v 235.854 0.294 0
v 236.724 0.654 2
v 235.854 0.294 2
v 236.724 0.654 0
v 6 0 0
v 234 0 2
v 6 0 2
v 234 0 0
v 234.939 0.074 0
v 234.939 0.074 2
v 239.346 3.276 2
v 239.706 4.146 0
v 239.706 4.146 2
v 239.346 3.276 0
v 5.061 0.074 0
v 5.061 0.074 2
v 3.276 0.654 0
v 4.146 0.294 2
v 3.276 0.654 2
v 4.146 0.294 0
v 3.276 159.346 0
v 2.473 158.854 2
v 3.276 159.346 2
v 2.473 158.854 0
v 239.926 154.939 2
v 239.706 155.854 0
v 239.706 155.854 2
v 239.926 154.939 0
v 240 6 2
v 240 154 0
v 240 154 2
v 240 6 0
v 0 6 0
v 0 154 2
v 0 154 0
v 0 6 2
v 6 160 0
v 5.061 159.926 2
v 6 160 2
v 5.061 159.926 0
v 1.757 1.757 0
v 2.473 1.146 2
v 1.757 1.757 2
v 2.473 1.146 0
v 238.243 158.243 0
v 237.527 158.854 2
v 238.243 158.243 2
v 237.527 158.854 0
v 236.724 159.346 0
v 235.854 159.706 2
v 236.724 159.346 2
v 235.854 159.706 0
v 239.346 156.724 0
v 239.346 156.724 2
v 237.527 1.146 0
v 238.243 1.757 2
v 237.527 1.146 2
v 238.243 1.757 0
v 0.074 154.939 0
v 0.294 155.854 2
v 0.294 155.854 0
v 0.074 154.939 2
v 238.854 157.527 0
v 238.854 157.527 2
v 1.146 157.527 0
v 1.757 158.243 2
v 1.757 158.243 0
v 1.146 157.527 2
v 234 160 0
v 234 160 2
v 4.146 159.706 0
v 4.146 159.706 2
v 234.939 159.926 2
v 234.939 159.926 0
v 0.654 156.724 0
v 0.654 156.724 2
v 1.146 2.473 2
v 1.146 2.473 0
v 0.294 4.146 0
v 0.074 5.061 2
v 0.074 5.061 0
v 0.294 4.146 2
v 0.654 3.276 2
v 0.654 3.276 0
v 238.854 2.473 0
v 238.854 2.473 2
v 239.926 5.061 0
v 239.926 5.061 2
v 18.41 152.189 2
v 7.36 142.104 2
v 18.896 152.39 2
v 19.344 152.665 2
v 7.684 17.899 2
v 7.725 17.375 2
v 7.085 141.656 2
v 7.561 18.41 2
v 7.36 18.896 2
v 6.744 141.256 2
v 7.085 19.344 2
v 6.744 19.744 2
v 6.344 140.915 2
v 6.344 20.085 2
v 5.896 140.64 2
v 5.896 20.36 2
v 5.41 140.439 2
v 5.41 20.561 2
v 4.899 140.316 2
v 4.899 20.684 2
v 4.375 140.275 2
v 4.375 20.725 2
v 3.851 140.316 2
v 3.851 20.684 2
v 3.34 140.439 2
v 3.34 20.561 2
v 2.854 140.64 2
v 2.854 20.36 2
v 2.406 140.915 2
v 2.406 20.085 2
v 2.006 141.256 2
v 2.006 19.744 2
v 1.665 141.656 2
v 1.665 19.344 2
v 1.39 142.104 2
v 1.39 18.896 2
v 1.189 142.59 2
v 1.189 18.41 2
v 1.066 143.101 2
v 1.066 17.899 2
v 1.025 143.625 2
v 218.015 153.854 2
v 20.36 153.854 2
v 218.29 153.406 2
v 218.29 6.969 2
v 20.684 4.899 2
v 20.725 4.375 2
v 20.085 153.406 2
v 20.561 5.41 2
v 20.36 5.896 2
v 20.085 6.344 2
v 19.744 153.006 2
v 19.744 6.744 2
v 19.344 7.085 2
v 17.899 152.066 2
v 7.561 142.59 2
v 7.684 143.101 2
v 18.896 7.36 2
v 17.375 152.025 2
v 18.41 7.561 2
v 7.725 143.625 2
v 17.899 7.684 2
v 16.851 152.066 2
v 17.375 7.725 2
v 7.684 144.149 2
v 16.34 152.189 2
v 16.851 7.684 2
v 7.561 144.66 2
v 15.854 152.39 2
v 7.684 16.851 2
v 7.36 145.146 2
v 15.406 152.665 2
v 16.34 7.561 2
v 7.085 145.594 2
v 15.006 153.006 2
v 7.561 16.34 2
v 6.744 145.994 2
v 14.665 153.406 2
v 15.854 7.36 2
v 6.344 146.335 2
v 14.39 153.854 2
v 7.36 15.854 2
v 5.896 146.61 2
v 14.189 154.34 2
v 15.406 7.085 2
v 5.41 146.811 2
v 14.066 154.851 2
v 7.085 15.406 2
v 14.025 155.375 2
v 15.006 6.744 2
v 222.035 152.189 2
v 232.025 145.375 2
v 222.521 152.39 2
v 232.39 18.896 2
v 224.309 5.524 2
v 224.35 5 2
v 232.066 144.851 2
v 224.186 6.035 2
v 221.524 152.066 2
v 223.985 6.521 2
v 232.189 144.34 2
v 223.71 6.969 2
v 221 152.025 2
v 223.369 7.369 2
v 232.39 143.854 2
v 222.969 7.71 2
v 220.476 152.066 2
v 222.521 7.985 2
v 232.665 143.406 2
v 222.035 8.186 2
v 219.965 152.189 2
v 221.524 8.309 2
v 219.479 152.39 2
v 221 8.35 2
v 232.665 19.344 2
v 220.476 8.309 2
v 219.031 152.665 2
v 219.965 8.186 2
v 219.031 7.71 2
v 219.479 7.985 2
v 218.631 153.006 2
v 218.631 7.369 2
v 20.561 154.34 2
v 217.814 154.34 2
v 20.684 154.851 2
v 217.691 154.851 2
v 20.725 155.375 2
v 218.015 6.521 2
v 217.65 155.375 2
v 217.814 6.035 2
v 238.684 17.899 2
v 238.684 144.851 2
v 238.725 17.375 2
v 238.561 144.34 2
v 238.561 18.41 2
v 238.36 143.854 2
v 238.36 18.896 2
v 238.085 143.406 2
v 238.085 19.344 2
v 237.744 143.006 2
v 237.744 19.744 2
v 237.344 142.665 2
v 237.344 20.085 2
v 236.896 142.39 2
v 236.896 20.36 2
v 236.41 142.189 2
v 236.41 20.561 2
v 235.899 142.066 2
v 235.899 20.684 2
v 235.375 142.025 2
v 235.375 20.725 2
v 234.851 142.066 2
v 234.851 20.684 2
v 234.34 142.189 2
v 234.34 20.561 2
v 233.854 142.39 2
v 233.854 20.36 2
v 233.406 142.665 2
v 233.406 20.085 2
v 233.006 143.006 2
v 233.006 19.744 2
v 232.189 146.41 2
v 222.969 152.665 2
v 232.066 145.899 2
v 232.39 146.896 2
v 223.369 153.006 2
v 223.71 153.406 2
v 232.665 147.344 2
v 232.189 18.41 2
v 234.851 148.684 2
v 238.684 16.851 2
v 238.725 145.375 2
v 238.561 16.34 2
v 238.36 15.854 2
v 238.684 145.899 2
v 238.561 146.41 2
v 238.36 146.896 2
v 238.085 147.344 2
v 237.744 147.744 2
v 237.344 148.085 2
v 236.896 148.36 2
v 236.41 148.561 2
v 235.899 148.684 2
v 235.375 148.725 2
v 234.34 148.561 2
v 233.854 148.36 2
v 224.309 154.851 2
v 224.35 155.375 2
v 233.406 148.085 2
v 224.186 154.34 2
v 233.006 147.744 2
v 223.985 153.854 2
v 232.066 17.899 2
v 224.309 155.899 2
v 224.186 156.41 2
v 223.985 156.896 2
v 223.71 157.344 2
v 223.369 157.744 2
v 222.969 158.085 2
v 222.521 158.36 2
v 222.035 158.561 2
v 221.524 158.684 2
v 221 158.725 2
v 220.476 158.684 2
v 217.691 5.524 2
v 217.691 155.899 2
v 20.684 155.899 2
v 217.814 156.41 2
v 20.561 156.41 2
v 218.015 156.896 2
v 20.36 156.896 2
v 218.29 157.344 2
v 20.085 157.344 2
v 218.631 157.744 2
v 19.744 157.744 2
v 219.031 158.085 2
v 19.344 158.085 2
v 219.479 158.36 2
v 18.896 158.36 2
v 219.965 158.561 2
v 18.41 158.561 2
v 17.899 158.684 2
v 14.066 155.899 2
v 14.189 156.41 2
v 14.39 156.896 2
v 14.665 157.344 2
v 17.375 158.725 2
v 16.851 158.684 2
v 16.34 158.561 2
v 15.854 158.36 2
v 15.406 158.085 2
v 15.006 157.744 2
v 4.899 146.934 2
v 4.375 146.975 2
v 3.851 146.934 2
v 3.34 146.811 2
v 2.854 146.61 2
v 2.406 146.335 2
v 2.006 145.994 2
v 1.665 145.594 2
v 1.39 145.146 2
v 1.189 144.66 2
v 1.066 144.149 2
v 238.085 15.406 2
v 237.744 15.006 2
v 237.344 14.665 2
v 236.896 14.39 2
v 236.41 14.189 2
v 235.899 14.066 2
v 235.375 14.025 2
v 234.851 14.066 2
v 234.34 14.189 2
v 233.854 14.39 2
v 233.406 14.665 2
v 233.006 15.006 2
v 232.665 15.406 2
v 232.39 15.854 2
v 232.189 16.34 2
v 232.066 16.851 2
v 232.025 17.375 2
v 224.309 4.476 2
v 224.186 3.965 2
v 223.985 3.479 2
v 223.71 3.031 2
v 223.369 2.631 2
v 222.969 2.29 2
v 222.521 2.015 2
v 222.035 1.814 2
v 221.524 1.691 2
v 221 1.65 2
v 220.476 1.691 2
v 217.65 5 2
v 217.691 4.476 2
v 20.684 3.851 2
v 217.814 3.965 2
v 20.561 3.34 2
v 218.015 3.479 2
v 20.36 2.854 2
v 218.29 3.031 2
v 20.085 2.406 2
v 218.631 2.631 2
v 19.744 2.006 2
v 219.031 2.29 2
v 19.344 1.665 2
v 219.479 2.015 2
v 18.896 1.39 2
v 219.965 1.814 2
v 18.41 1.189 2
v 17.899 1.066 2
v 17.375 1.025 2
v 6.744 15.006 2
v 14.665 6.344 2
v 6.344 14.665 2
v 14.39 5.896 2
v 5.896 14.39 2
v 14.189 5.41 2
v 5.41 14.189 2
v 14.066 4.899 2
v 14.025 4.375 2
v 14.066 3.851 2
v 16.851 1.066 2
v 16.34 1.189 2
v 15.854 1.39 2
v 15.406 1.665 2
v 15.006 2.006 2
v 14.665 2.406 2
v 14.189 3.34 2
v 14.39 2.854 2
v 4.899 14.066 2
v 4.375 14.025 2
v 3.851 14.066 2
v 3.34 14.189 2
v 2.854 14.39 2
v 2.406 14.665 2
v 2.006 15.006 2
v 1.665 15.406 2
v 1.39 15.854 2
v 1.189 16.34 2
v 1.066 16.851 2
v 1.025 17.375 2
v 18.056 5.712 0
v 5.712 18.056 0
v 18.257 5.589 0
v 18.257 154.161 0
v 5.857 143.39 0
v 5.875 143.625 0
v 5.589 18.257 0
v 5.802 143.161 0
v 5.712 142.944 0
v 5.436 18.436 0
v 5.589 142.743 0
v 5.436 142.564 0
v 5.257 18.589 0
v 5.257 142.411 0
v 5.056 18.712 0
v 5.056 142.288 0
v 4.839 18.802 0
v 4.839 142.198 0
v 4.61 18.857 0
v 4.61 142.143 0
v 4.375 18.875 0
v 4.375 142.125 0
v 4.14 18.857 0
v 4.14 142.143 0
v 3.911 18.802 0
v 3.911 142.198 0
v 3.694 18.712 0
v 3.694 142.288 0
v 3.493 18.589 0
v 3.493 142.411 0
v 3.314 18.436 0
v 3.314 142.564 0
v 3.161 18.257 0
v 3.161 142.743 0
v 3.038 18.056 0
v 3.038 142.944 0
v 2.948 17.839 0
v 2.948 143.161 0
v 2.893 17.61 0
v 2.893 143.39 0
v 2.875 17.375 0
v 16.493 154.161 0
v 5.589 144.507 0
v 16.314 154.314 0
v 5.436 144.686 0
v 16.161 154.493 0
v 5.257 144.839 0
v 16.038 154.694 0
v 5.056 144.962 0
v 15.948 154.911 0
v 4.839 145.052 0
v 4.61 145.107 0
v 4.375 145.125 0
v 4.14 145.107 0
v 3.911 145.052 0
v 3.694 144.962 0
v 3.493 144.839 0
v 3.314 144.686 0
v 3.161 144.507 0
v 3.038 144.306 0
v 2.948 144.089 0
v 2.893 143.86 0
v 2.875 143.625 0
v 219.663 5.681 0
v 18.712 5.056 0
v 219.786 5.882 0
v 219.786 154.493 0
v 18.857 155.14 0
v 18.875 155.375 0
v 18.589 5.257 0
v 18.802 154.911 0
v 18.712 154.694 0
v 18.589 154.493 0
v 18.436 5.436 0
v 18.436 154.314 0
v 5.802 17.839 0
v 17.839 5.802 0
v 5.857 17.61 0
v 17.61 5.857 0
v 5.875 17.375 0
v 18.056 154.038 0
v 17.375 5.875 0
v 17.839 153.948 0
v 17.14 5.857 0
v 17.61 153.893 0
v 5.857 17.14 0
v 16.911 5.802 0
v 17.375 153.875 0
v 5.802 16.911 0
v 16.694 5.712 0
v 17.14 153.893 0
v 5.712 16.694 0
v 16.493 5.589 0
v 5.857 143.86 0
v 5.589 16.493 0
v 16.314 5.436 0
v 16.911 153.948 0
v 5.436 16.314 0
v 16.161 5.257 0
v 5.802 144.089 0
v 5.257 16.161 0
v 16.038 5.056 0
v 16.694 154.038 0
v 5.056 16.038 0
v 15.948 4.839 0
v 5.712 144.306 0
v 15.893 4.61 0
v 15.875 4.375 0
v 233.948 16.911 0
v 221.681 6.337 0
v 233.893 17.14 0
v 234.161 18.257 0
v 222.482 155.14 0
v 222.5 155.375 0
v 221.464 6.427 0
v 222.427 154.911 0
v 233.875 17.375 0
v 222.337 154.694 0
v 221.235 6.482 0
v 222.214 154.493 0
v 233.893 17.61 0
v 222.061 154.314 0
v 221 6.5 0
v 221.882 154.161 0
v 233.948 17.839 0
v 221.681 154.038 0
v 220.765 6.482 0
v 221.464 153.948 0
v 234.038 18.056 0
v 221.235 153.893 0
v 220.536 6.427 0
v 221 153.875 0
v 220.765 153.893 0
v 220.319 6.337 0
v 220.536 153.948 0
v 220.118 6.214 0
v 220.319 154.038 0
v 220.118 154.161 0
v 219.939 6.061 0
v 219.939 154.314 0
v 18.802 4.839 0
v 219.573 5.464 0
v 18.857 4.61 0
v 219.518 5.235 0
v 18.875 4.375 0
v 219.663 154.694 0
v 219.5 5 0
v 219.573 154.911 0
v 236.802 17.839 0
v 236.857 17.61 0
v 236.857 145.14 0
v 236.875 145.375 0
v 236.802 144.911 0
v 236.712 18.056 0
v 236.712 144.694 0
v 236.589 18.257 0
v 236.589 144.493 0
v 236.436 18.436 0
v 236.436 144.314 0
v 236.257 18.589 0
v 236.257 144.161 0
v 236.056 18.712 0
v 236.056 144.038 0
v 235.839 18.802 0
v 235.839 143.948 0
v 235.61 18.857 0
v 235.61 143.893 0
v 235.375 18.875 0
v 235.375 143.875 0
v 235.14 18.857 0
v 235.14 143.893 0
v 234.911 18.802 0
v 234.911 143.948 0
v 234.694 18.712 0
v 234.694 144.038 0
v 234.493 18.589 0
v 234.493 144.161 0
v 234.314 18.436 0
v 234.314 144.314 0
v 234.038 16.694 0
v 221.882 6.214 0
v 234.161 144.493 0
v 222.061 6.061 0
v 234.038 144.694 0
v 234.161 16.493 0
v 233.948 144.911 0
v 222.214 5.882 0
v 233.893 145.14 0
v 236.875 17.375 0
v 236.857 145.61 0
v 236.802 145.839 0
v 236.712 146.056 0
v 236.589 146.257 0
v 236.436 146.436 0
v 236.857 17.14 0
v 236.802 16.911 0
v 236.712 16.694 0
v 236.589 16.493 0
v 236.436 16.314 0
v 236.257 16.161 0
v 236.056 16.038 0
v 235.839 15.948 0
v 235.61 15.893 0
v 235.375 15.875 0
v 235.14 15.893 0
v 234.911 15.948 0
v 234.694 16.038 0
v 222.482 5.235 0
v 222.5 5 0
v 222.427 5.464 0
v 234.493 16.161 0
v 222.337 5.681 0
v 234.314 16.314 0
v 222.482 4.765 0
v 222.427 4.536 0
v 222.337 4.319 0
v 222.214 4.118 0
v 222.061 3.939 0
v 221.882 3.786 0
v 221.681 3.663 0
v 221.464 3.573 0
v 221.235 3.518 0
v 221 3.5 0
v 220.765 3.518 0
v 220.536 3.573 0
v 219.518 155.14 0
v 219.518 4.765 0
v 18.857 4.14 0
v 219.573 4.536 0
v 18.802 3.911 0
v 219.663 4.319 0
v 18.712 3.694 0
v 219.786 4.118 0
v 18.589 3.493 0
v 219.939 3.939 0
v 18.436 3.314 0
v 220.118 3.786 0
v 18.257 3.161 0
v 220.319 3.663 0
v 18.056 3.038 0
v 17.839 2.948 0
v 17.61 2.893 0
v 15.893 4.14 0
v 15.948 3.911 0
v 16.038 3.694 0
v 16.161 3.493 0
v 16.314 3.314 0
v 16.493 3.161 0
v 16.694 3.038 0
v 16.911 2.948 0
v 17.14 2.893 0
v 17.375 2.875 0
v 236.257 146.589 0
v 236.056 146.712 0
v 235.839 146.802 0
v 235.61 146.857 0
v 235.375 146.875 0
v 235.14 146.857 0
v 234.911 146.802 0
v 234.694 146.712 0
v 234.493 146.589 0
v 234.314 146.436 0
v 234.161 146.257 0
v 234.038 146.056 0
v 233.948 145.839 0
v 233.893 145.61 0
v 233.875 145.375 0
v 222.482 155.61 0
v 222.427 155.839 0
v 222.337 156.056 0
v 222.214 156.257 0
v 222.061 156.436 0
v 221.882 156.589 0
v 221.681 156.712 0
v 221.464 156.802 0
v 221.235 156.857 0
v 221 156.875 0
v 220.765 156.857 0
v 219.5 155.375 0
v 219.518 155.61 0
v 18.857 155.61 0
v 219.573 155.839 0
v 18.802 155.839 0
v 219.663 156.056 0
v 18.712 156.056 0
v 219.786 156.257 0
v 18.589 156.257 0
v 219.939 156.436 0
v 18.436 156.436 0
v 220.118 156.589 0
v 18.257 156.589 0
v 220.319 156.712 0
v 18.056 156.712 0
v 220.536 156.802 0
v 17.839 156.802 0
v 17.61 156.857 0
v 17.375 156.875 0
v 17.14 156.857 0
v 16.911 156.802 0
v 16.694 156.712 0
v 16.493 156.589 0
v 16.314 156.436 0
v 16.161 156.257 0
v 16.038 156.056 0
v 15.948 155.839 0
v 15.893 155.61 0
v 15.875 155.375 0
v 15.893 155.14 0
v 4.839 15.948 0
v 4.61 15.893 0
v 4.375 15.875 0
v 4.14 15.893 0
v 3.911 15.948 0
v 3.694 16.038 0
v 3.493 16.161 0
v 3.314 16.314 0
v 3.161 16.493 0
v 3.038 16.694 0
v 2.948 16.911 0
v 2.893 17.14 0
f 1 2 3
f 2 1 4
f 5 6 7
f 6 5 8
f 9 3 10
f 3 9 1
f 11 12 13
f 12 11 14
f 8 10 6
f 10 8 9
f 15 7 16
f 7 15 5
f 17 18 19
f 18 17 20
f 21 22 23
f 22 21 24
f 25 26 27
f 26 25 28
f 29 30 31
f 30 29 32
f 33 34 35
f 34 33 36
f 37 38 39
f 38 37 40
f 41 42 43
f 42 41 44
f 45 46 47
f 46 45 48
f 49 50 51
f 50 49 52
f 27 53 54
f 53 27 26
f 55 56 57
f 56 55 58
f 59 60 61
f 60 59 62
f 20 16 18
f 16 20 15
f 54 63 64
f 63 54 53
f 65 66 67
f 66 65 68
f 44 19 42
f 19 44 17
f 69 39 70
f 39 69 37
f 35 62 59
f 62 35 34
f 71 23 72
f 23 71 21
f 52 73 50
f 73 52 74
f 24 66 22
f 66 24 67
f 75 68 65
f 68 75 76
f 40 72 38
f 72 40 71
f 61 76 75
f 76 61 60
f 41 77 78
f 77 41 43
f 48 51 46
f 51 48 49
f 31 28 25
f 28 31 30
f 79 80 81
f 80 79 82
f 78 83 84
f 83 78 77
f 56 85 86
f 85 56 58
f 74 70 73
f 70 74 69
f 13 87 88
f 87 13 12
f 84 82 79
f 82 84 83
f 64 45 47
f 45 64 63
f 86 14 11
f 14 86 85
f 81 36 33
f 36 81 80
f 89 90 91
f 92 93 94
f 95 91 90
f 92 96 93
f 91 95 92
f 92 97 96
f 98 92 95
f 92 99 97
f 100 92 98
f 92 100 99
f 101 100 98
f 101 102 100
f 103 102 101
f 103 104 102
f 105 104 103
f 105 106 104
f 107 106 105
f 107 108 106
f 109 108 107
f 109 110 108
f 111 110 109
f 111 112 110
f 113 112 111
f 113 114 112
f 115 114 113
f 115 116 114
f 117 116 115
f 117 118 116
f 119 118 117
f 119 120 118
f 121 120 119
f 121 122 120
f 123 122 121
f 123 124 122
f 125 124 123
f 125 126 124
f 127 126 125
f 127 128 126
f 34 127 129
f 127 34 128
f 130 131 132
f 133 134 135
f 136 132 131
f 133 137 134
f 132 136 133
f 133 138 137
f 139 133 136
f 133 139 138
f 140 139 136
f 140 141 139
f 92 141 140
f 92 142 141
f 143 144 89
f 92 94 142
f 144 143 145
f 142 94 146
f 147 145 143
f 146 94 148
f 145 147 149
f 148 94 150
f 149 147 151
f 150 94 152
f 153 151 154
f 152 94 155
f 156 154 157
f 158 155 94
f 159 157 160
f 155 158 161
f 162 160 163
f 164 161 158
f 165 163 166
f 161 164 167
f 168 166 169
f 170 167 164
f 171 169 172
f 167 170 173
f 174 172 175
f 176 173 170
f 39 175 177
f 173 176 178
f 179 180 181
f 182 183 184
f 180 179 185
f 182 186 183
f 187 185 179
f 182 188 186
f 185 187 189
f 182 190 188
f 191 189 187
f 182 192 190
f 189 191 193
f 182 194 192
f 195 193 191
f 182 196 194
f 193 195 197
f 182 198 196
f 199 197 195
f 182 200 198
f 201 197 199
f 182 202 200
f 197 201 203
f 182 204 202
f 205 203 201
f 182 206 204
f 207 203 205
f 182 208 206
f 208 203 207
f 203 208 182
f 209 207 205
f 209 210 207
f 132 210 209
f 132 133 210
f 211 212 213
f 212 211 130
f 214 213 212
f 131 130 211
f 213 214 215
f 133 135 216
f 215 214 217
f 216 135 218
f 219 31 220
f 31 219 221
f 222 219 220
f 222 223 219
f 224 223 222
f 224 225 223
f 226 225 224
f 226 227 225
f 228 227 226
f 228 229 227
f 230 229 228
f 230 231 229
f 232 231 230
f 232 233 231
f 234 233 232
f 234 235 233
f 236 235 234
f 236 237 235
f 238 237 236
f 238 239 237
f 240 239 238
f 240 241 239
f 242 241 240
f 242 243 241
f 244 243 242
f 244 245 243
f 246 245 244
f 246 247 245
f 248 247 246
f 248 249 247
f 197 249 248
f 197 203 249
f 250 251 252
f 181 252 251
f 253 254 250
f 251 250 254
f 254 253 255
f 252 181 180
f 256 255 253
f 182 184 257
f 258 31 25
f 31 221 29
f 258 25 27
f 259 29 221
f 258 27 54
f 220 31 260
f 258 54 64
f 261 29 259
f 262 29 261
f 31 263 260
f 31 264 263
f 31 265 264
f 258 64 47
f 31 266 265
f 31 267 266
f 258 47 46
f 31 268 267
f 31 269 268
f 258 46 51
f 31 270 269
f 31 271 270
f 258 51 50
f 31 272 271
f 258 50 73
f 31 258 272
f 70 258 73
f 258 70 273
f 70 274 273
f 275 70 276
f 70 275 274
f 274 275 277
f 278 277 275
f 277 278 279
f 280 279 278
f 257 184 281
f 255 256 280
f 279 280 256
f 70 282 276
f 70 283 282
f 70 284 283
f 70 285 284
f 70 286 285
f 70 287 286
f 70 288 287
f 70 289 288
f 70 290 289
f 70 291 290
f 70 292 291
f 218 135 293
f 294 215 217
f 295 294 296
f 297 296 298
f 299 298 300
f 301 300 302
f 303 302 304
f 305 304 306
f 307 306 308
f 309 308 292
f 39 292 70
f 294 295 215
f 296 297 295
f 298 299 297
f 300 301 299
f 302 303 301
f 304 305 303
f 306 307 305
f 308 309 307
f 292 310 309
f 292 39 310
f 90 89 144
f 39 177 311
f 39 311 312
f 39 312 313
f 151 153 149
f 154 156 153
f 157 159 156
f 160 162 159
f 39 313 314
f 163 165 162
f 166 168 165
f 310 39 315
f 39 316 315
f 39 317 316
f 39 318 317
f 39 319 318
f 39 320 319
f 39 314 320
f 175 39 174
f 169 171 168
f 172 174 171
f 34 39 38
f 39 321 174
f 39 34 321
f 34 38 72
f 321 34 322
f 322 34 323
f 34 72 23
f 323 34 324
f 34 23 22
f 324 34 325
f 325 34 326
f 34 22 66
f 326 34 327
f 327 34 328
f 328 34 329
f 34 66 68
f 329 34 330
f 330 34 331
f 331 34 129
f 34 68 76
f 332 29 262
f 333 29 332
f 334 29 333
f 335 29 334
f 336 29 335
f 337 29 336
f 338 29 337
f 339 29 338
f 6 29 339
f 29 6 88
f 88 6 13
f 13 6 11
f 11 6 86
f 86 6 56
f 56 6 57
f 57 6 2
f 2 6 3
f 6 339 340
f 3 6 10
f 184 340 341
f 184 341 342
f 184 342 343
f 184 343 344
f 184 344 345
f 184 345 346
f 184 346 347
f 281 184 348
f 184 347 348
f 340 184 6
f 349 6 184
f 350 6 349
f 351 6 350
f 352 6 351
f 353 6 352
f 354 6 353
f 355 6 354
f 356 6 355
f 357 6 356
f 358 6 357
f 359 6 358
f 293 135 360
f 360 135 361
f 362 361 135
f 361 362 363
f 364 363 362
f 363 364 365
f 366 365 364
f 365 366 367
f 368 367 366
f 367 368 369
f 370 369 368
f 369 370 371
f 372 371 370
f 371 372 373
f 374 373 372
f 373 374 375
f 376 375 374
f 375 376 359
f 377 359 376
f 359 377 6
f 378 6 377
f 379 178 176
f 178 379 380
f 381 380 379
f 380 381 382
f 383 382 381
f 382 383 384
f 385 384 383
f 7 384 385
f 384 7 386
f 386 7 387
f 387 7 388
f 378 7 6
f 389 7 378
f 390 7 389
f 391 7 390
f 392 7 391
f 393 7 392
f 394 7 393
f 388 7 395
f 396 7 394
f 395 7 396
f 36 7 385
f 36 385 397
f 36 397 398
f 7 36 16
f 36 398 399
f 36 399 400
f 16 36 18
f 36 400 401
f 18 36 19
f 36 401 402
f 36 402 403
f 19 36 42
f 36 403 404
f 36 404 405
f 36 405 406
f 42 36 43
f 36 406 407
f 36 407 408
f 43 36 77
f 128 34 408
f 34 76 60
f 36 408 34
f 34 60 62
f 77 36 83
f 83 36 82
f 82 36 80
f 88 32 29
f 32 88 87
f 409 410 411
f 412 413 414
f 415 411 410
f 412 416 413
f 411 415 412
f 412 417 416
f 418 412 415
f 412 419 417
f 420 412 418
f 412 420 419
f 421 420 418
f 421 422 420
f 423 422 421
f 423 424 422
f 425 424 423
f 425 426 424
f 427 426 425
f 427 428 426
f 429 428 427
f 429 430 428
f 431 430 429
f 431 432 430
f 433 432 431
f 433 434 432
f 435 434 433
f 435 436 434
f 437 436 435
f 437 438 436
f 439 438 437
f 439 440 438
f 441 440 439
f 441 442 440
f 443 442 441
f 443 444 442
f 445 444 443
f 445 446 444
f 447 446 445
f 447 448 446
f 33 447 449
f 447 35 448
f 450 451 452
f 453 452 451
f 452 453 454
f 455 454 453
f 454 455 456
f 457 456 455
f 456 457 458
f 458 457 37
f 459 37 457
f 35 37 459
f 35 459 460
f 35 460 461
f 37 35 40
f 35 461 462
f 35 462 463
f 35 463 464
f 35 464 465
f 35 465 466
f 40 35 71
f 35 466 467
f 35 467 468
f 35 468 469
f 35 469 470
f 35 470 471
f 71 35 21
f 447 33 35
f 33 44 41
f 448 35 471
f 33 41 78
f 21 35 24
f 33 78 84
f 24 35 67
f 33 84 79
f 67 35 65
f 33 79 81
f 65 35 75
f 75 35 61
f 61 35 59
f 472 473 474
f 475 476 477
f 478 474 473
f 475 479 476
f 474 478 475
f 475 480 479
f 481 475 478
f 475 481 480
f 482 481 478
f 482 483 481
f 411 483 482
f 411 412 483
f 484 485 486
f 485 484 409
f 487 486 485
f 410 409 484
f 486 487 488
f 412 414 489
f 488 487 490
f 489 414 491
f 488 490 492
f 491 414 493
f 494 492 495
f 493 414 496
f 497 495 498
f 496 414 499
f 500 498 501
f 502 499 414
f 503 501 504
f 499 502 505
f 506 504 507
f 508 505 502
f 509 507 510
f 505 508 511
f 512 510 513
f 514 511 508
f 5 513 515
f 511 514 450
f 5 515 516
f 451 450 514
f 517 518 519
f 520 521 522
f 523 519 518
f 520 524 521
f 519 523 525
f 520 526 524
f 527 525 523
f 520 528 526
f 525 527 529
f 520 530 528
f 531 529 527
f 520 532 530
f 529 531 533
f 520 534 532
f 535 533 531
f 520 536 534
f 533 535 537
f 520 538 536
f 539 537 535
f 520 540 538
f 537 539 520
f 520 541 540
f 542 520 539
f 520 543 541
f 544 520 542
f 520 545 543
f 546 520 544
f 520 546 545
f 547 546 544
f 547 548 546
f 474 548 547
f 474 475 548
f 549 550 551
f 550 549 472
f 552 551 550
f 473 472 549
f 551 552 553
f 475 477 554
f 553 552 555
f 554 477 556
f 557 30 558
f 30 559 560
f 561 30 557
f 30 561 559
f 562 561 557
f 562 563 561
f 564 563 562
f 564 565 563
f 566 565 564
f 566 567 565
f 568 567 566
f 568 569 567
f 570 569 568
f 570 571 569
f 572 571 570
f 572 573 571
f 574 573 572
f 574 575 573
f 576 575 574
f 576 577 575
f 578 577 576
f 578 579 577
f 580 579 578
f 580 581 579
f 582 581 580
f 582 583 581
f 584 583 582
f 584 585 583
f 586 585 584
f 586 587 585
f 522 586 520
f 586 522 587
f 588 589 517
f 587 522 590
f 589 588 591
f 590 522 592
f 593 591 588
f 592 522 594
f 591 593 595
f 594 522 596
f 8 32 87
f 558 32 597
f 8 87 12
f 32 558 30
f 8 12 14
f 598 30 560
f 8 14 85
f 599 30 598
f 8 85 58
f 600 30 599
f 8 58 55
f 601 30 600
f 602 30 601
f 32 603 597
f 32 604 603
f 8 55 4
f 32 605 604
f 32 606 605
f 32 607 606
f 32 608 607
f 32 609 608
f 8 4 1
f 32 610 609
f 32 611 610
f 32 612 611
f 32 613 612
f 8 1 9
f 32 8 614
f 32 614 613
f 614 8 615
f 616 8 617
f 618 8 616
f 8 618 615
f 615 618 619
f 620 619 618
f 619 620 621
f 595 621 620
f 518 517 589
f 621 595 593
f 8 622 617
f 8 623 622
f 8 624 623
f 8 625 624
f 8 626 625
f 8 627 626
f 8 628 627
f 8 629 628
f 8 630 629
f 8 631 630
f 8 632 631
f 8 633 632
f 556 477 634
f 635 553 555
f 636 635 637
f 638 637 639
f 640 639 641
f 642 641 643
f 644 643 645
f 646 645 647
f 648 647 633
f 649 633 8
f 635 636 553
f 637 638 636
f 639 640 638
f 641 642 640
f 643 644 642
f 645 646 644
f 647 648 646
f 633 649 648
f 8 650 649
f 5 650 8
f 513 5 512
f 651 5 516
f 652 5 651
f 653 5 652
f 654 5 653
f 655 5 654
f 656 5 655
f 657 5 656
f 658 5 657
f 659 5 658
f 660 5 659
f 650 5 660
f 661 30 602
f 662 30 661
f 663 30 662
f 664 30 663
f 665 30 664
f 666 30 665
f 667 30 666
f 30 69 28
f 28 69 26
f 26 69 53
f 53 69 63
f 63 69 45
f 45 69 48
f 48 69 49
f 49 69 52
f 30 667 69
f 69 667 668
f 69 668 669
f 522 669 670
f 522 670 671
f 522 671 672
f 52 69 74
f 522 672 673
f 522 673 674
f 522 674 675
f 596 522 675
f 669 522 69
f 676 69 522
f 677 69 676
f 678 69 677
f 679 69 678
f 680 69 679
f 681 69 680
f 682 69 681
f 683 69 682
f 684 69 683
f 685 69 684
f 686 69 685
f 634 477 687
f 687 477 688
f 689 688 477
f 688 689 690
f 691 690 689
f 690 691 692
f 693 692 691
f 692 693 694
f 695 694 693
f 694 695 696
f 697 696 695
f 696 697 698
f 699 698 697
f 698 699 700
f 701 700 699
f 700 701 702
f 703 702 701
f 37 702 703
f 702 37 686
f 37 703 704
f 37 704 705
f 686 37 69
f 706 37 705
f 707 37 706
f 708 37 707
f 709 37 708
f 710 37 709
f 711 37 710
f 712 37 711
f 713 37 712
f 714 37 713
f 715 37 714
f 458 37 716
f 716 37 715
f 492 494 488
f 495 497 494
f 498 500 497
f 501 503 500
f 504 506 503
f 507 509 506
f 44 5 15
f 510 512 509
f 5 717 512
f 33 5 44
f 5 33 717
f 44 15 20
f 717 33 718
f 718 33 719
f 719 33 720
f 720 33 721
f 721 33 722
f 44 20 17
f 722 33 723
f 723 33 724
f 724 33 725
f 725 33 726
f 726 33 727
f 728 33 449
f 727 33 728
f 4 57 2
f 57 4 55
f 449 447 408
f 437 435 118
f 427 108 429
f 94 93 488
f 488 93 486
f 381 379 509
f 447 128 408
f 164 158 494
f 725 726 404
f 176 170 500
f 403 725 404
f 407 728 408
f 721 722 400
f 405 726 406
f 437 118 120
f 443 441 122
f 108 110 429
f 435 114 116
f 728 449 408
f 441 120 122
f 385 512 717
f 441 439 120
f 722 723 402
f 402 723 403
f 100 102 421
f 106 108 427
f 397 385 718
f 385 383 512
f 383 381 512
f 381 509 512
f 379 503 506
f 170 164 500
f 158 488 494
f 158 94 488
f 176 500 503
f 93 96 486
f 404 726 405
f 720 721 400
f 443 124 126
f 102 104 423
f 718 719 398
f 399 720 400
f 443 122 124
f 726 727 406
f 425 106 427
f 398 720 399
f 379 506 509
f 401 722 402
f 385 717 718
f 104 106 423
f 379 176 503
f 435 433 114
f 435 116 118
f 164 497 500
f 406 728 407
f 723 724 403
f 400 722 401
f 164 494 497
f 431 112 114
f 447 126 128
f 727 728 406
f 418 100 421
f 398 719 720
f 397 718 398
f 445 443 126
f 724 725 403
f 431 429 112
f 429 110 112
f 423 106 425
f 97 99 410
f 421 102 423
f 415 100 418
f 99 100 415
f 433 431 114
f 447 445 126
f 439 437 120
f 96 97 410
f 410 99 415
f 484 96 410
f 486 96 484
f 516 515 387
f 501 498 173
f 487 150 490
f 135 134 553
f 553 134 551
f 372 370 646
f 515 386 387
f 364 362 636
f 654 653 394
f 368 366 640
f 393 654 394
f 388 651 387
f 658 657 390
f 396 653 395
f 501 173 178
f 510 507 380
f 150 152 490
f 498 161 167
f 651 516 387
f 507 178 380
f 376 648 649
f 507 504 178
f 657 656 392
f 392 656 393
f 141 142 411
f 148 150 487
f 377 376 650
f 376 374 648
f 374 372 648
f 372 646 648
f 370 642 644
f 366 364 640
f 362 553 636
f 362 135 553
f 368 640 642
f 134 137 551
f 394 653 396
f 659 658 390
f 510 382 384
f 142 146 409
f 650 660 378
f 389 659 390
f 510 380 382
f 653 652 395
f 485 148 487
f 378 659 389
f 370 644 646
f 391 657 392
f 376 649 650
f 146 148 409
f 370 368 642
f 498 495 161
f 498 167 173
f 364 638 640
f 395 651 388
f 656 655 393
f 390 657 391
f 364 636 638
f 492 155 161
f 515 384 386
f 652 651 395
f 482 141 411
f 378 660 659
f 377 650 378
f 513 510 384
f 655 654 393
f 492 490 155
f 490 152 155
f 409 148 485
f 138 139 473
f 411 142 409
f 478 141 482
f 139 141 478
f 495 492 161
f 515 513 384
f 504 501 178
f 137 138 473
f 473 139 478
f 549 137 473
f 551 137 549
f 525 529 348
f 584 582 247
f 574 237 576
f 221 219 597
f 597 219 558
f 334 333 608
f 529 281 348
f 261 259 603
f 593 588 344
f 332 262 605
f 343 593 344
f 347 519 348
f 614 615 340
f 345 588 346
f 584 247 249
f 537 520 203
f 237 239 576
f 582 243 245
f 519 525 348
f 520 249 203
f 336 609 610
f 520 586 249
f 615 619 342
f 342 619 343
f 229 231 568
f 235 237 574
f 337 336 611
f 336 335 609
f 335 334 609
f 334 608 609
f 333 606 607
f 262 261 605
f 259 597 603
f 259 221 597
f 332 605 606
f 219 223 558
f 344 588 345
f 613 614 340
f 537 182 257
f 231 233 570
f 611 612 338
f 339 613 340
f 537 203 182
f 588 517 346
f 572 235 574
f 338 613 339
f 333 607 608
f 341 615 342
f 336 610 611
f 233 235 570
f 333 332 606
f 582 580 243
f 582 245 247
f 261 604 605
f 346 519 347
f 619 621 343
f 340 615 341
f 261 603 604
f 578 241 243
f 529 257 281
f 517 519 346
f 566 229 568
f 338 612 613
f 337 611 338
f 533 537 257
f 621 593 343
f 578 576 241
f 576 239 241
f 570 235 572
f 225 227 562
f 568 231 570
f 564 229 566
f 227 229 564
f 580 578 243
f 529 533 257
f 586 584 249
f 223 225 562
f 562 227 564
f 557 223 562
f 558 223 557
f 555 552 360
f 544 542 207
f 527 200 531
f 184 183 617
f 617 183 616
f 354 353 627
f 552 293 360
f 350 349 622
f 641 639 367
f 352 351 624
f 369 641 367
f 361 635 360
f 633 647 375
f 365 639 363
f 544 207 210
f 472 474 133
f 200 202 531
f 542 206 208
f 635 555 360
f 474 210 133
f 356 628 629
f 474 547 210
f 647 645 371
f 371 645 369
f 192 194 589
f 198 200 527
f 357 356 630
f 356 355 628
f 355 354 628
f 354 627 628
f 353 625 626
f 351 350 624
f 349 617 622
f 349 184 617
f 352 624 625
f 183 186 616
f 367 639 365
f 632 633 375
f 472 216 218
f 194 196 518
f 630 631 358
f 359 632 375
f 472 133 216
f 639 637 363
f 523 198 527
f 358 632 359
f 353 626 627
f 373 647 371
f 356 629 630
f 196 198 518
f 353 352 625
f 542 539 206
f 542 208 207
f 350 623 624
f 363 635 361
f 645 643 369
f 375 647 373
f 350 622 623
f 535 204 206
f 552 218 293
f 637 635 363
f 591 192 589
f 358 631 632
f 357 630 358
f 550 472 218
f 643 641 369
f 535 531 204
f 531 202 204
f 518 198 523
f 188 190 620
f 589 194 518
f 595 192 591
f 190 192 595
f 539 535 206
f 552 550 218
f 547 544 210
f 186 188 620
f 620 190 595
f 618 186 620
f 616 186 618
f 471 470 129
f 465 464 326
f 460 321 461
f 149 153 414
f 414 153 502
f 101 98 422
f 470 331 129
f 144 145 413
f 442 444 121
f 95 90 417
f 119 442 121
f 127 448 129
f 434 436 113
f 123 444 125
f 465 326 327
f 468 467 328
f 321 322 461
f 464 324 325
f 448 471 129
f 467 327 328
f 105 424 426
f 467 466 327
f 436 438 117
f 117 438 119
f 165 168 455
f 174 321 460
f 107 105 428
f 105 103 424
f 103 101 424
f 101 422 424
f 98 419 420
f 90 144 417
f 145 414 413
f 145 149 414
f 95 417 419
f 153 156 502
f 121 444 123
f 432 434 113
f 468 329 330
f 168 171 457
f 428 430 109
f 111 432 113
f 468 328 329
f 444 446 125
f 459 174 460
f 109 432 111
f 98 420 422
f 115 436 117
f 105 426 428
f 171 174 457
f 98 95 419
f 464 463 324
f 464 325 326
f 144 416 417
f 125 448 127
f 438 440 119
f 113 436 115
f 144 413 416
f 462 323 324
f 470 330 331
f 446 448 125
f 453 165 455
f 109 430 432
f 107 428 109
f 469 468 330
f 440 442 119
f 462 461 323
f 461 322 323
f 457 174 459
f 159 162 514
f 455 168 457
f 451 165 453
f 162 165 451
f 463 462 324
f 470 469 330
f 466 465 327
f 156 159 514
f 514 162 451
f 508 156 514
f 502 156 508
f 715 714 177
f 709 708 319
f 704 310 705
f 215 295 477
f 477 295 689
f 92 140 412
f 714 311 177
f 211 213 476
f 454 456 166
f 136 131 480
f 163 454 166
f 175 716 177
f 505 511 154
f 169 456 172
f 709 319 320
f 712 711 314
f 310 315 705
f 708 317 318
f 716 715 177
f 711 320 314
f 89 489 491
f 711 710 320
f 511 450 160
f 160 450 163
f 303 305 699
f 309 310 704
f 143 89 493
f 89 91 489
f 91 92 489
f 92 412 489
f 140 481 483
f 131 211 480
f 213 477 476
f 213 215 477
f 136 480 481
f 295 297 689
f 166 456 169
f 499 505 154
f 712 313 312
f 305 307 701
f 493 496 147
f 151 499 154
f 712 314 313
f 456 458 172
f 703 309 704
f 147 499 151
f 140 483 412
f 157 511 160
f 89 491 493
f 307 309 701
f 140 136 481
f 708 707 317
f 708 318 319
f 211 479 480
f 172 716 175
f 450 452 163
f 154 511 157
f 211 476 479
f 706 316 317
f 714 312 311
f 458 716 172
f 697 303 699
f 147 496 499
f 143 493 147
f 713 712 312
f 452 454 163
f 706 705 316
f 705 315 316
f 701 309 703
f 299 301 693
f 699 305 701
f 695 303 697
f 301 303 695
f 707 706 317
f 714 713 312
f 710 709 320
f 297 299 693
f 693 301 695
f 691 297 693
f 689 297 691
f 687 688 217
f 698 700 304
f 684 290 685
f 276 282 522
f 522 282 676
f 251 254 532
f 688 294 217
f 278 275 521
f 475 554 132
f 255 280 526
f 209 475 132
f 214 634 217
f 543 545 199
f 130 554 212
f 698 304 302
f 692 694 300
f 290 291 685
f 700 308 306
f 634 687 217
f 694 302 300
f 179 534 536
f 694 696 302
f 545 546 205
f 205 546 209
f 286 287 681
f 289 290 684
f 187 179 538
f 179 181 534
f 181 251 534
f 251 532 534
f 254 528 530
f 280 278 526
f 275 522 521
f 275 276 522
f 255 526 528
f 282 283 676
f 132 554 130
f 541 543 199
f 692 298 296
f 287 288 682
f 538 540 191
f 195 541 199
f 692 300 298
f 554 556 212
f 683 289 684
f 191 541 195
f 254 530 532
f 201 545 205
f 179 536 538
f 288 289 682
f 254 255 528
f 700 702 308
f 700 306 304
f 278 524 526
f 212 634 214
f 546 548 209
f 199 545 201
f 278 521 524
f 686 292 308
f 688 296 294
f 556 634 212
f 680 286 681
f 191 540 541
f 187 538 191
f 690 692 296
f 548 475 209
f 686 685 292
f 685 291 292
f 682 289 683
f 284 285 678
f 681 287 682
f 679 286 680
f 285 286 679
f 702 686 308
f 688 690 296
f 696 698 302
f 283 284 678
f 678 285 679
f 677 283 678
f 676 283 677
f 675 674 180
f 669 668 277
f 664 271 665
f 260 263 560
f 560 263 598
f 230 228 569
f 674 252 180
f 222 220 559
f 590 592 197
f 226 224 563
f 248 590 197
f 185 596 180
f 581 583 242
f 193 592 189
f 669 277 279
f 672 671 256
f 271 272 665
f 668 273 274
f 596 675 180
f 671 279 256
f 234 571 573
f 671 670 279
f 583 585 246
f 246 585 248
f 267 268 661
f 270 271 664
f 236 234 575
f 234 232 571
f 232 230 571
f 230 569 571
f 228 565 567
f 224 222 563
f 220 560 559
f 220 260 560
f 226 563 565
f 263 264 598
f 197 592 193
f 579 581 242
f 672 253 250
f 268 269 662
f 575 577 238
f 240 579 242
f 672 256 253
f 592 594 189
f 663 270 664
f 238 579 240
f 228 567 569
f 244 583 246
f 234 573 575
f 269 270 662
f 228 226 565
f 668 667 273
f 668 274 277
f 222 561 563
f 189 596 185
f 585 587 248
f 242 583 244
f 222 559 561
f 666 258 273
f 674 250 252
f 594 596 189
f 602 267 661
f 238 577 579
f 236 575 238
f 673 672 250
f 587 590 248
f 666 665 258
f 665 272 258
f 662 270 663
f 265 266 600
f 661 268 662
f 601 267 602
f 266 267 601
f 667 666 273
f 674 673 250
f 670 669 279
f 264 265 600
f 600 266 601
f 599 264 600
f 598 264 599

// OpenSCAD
$fn=40;
//Panel Dimension
hitBoxLength = 228;
hitBoxWidth = 148;
hitBoxHeight = 2;
cornerRadius = 6;
wallThickness = 3;

//mounting hole
outerDiameter = 6.7;
innerDiameter = 3;
mountDiameter = 2.75;
mountOuterRadius = mountDiameter/2 + 3;
difference(){
linear_extrude(hitBoxHeight)
offset(r = cornerRadius)
translate([cornerRadius,cornerRadius,0])
square([hitBoxLength, hitBoxWidth]);

// Add mounting holes
translate([wallThickness + mountOuterRadius -3, wallThickness + mountOuterRadius + 10, 0])
    cylinder(h = hitBoxHeight, d1 = innerDiameter, d2 = outerDiameter);

translate([wallThickness + mountOuterRadius + 10, wallThickness + mountOuterRadius - 3, 0])
    cylinder(h = hitBoxHeight, d1 = innerDiameter, d2 = outerDiameter);

translate([wallThickness + hitBoxLength + mountOuterRadius, wallThickness + mountOuterRadius + 10, 0])
    cylinder(h = hitBoxHeight, d1 = innerDiameter, d2 = outerDiameter);

translate([wallThickness + hitBoxLength - 10, wallThickness + 2, 0])
    cylinder(h = hitBoxHeight, d1 = innerDiameter, d2 = outerDiameter);

translate([wallThickness + mountOuterRadius -3, wallThickness + hitBoxWidth - mountOuterRadius - 3, 0])
    cylinder(h = hitBoxHeight, d1 = innerDiameter, d2 = outerDiameter);

translate([wallThickness + mountOuterRadius + 10, wallThickness + hitBoxWidth + mountOuterRadius, 0])
    cylinder(h = hitBoxHeight, d1 = innerDiameter, d2 = outerDiameter);

translate([wallThickness + hitBoxLength - 10, wallThickness + hitBoxWidth + mountOuterRadius, 0])
    cylinder(h = hitBoxHeight, d1 = innerDiameter, d2 = outerDiameter);

translate([wallThickness + hitBoxLength + mountOuterRadius, wallThickness + hitBoxWidth + mountOuterRadius - 10, 0])
    cylinder(h = hitBoxHeight, d1 = innerDiameter, d2 = outerDiameter);
}
